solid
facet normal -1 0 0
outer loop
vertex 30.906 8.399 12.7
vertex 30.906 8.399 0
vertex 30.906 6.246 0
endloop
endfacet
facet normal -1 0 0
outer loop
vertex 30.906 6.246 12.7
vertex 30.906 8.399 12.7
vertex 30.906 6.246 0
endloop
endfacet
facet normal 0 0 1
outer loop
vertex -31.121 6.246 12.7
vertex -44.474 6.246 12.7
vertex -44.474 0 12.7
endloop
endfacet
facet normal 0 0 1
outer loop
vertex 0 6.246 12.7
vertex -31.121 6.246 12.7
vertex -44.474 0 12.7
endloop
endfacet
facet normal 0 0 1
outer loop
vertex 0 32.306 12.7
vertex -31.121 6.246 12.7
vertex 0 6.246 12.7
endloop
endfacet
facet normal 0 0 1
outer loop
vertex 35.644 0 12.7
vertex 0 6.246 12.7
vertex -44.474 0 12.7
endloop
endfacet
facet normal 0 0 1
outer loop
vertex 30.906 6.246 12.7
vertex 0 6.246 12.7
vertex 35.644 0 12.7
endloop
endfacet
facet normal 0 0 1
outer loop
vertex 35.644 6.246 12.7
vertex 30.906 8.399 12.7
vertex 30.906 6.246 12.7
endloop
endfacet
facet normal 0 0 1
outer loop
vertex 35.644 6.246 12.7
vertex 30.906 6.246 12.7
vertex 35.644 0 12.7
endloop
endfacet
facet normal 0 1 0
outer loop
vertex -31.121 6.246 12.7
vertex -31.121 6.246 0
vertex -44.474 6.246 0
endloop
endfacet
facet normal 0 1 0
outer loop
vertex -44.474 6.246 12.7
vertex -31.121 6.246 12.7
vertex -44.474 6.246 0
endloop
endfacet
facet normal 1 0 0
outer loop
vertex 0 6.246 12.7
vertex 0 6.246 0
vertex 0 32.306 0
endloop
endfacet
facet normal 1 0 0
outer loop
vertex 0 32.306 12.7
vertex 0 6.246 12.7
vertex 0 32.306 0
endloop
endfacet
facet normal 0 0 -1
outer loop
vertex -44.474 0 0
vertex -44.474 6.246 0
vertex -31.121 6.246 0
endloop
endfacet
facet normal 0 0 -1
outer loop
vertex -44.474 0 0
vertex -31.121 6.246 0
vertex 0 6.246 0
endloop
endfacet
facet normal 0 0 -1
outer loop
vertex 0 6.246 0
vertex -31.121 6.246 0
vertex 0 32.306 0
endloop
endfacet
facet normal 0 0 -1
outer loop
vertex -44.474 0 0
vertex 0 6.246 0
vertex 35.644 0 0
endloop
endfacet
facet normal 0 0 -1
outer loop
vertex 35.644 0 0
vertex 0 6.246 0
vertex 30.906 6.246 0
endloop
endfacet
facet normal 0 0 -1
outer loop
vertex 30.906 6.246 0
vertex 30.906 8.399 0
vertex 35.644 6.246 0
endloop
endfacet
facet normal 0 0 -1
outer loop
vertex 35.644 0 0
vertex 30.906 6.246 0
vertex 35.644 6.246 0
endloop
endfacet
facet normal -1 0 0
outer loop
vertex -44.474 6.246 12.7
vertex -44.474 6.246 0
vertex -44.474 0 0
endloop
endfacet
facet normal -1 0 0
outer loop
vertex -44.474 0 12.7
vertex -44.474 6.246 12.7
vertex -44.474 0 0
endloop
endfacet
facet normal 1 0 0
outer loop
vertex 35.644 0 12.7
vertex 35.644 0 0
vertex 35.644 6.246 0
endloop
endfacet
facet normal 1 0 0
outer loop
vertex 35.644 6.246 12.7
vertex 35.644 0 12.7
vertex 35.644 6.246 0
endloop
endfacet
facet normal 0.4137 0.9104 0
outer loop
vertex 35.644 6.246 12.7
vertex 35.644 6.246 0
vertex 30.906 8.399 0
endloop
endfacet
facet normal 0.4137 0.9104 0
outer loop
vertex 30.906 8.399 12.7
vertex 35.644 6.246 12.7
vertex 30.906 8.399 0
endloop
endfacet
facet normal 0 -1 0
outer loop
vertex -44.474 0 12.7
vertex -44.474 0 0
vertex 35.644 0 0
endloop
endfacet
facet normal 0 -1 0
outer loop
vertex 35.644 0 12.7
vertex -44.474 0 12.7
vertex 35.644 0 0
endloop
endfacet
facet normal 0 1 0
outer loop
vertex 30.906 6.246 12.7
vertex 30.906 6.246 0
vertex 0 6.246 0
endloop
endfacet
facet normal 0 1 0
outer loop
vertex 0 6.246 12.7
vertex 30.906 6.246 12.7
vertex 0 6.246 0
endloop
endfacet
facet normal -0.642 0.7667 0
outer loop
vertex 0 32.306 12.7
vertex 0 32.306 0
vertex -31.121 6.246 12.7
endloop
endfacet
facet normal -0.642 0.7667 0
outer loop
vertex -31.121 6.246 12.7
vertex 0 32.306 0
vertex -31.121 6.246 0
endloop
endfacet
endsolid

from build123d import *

# Parameters (mm, degrees)
F1_DEPTH = 12.7


with BuildPart() as f1:
    # F0 (on Top) → F1 (new body)
    with BuildSketch(Plane.XY):
        Polygon((-31.120982, 6.245733), (-44.473931, 6.245733), (-44.473931, 0), (35.643756, 0), (35.643756, 6.245733), (30.905612, 6.245733), (0, 6.245733), align=None)
        Polygon((0, 32.30552), (-31.120982, 6.245733), (0, 6.245733), align=None)
        Polygon((30.905612, 8.399435), (30.905612, 6.245733), (35.643756, 6.245733), align=None)
    extrude(amount=F1_DEPTH)


solid = f1.part
